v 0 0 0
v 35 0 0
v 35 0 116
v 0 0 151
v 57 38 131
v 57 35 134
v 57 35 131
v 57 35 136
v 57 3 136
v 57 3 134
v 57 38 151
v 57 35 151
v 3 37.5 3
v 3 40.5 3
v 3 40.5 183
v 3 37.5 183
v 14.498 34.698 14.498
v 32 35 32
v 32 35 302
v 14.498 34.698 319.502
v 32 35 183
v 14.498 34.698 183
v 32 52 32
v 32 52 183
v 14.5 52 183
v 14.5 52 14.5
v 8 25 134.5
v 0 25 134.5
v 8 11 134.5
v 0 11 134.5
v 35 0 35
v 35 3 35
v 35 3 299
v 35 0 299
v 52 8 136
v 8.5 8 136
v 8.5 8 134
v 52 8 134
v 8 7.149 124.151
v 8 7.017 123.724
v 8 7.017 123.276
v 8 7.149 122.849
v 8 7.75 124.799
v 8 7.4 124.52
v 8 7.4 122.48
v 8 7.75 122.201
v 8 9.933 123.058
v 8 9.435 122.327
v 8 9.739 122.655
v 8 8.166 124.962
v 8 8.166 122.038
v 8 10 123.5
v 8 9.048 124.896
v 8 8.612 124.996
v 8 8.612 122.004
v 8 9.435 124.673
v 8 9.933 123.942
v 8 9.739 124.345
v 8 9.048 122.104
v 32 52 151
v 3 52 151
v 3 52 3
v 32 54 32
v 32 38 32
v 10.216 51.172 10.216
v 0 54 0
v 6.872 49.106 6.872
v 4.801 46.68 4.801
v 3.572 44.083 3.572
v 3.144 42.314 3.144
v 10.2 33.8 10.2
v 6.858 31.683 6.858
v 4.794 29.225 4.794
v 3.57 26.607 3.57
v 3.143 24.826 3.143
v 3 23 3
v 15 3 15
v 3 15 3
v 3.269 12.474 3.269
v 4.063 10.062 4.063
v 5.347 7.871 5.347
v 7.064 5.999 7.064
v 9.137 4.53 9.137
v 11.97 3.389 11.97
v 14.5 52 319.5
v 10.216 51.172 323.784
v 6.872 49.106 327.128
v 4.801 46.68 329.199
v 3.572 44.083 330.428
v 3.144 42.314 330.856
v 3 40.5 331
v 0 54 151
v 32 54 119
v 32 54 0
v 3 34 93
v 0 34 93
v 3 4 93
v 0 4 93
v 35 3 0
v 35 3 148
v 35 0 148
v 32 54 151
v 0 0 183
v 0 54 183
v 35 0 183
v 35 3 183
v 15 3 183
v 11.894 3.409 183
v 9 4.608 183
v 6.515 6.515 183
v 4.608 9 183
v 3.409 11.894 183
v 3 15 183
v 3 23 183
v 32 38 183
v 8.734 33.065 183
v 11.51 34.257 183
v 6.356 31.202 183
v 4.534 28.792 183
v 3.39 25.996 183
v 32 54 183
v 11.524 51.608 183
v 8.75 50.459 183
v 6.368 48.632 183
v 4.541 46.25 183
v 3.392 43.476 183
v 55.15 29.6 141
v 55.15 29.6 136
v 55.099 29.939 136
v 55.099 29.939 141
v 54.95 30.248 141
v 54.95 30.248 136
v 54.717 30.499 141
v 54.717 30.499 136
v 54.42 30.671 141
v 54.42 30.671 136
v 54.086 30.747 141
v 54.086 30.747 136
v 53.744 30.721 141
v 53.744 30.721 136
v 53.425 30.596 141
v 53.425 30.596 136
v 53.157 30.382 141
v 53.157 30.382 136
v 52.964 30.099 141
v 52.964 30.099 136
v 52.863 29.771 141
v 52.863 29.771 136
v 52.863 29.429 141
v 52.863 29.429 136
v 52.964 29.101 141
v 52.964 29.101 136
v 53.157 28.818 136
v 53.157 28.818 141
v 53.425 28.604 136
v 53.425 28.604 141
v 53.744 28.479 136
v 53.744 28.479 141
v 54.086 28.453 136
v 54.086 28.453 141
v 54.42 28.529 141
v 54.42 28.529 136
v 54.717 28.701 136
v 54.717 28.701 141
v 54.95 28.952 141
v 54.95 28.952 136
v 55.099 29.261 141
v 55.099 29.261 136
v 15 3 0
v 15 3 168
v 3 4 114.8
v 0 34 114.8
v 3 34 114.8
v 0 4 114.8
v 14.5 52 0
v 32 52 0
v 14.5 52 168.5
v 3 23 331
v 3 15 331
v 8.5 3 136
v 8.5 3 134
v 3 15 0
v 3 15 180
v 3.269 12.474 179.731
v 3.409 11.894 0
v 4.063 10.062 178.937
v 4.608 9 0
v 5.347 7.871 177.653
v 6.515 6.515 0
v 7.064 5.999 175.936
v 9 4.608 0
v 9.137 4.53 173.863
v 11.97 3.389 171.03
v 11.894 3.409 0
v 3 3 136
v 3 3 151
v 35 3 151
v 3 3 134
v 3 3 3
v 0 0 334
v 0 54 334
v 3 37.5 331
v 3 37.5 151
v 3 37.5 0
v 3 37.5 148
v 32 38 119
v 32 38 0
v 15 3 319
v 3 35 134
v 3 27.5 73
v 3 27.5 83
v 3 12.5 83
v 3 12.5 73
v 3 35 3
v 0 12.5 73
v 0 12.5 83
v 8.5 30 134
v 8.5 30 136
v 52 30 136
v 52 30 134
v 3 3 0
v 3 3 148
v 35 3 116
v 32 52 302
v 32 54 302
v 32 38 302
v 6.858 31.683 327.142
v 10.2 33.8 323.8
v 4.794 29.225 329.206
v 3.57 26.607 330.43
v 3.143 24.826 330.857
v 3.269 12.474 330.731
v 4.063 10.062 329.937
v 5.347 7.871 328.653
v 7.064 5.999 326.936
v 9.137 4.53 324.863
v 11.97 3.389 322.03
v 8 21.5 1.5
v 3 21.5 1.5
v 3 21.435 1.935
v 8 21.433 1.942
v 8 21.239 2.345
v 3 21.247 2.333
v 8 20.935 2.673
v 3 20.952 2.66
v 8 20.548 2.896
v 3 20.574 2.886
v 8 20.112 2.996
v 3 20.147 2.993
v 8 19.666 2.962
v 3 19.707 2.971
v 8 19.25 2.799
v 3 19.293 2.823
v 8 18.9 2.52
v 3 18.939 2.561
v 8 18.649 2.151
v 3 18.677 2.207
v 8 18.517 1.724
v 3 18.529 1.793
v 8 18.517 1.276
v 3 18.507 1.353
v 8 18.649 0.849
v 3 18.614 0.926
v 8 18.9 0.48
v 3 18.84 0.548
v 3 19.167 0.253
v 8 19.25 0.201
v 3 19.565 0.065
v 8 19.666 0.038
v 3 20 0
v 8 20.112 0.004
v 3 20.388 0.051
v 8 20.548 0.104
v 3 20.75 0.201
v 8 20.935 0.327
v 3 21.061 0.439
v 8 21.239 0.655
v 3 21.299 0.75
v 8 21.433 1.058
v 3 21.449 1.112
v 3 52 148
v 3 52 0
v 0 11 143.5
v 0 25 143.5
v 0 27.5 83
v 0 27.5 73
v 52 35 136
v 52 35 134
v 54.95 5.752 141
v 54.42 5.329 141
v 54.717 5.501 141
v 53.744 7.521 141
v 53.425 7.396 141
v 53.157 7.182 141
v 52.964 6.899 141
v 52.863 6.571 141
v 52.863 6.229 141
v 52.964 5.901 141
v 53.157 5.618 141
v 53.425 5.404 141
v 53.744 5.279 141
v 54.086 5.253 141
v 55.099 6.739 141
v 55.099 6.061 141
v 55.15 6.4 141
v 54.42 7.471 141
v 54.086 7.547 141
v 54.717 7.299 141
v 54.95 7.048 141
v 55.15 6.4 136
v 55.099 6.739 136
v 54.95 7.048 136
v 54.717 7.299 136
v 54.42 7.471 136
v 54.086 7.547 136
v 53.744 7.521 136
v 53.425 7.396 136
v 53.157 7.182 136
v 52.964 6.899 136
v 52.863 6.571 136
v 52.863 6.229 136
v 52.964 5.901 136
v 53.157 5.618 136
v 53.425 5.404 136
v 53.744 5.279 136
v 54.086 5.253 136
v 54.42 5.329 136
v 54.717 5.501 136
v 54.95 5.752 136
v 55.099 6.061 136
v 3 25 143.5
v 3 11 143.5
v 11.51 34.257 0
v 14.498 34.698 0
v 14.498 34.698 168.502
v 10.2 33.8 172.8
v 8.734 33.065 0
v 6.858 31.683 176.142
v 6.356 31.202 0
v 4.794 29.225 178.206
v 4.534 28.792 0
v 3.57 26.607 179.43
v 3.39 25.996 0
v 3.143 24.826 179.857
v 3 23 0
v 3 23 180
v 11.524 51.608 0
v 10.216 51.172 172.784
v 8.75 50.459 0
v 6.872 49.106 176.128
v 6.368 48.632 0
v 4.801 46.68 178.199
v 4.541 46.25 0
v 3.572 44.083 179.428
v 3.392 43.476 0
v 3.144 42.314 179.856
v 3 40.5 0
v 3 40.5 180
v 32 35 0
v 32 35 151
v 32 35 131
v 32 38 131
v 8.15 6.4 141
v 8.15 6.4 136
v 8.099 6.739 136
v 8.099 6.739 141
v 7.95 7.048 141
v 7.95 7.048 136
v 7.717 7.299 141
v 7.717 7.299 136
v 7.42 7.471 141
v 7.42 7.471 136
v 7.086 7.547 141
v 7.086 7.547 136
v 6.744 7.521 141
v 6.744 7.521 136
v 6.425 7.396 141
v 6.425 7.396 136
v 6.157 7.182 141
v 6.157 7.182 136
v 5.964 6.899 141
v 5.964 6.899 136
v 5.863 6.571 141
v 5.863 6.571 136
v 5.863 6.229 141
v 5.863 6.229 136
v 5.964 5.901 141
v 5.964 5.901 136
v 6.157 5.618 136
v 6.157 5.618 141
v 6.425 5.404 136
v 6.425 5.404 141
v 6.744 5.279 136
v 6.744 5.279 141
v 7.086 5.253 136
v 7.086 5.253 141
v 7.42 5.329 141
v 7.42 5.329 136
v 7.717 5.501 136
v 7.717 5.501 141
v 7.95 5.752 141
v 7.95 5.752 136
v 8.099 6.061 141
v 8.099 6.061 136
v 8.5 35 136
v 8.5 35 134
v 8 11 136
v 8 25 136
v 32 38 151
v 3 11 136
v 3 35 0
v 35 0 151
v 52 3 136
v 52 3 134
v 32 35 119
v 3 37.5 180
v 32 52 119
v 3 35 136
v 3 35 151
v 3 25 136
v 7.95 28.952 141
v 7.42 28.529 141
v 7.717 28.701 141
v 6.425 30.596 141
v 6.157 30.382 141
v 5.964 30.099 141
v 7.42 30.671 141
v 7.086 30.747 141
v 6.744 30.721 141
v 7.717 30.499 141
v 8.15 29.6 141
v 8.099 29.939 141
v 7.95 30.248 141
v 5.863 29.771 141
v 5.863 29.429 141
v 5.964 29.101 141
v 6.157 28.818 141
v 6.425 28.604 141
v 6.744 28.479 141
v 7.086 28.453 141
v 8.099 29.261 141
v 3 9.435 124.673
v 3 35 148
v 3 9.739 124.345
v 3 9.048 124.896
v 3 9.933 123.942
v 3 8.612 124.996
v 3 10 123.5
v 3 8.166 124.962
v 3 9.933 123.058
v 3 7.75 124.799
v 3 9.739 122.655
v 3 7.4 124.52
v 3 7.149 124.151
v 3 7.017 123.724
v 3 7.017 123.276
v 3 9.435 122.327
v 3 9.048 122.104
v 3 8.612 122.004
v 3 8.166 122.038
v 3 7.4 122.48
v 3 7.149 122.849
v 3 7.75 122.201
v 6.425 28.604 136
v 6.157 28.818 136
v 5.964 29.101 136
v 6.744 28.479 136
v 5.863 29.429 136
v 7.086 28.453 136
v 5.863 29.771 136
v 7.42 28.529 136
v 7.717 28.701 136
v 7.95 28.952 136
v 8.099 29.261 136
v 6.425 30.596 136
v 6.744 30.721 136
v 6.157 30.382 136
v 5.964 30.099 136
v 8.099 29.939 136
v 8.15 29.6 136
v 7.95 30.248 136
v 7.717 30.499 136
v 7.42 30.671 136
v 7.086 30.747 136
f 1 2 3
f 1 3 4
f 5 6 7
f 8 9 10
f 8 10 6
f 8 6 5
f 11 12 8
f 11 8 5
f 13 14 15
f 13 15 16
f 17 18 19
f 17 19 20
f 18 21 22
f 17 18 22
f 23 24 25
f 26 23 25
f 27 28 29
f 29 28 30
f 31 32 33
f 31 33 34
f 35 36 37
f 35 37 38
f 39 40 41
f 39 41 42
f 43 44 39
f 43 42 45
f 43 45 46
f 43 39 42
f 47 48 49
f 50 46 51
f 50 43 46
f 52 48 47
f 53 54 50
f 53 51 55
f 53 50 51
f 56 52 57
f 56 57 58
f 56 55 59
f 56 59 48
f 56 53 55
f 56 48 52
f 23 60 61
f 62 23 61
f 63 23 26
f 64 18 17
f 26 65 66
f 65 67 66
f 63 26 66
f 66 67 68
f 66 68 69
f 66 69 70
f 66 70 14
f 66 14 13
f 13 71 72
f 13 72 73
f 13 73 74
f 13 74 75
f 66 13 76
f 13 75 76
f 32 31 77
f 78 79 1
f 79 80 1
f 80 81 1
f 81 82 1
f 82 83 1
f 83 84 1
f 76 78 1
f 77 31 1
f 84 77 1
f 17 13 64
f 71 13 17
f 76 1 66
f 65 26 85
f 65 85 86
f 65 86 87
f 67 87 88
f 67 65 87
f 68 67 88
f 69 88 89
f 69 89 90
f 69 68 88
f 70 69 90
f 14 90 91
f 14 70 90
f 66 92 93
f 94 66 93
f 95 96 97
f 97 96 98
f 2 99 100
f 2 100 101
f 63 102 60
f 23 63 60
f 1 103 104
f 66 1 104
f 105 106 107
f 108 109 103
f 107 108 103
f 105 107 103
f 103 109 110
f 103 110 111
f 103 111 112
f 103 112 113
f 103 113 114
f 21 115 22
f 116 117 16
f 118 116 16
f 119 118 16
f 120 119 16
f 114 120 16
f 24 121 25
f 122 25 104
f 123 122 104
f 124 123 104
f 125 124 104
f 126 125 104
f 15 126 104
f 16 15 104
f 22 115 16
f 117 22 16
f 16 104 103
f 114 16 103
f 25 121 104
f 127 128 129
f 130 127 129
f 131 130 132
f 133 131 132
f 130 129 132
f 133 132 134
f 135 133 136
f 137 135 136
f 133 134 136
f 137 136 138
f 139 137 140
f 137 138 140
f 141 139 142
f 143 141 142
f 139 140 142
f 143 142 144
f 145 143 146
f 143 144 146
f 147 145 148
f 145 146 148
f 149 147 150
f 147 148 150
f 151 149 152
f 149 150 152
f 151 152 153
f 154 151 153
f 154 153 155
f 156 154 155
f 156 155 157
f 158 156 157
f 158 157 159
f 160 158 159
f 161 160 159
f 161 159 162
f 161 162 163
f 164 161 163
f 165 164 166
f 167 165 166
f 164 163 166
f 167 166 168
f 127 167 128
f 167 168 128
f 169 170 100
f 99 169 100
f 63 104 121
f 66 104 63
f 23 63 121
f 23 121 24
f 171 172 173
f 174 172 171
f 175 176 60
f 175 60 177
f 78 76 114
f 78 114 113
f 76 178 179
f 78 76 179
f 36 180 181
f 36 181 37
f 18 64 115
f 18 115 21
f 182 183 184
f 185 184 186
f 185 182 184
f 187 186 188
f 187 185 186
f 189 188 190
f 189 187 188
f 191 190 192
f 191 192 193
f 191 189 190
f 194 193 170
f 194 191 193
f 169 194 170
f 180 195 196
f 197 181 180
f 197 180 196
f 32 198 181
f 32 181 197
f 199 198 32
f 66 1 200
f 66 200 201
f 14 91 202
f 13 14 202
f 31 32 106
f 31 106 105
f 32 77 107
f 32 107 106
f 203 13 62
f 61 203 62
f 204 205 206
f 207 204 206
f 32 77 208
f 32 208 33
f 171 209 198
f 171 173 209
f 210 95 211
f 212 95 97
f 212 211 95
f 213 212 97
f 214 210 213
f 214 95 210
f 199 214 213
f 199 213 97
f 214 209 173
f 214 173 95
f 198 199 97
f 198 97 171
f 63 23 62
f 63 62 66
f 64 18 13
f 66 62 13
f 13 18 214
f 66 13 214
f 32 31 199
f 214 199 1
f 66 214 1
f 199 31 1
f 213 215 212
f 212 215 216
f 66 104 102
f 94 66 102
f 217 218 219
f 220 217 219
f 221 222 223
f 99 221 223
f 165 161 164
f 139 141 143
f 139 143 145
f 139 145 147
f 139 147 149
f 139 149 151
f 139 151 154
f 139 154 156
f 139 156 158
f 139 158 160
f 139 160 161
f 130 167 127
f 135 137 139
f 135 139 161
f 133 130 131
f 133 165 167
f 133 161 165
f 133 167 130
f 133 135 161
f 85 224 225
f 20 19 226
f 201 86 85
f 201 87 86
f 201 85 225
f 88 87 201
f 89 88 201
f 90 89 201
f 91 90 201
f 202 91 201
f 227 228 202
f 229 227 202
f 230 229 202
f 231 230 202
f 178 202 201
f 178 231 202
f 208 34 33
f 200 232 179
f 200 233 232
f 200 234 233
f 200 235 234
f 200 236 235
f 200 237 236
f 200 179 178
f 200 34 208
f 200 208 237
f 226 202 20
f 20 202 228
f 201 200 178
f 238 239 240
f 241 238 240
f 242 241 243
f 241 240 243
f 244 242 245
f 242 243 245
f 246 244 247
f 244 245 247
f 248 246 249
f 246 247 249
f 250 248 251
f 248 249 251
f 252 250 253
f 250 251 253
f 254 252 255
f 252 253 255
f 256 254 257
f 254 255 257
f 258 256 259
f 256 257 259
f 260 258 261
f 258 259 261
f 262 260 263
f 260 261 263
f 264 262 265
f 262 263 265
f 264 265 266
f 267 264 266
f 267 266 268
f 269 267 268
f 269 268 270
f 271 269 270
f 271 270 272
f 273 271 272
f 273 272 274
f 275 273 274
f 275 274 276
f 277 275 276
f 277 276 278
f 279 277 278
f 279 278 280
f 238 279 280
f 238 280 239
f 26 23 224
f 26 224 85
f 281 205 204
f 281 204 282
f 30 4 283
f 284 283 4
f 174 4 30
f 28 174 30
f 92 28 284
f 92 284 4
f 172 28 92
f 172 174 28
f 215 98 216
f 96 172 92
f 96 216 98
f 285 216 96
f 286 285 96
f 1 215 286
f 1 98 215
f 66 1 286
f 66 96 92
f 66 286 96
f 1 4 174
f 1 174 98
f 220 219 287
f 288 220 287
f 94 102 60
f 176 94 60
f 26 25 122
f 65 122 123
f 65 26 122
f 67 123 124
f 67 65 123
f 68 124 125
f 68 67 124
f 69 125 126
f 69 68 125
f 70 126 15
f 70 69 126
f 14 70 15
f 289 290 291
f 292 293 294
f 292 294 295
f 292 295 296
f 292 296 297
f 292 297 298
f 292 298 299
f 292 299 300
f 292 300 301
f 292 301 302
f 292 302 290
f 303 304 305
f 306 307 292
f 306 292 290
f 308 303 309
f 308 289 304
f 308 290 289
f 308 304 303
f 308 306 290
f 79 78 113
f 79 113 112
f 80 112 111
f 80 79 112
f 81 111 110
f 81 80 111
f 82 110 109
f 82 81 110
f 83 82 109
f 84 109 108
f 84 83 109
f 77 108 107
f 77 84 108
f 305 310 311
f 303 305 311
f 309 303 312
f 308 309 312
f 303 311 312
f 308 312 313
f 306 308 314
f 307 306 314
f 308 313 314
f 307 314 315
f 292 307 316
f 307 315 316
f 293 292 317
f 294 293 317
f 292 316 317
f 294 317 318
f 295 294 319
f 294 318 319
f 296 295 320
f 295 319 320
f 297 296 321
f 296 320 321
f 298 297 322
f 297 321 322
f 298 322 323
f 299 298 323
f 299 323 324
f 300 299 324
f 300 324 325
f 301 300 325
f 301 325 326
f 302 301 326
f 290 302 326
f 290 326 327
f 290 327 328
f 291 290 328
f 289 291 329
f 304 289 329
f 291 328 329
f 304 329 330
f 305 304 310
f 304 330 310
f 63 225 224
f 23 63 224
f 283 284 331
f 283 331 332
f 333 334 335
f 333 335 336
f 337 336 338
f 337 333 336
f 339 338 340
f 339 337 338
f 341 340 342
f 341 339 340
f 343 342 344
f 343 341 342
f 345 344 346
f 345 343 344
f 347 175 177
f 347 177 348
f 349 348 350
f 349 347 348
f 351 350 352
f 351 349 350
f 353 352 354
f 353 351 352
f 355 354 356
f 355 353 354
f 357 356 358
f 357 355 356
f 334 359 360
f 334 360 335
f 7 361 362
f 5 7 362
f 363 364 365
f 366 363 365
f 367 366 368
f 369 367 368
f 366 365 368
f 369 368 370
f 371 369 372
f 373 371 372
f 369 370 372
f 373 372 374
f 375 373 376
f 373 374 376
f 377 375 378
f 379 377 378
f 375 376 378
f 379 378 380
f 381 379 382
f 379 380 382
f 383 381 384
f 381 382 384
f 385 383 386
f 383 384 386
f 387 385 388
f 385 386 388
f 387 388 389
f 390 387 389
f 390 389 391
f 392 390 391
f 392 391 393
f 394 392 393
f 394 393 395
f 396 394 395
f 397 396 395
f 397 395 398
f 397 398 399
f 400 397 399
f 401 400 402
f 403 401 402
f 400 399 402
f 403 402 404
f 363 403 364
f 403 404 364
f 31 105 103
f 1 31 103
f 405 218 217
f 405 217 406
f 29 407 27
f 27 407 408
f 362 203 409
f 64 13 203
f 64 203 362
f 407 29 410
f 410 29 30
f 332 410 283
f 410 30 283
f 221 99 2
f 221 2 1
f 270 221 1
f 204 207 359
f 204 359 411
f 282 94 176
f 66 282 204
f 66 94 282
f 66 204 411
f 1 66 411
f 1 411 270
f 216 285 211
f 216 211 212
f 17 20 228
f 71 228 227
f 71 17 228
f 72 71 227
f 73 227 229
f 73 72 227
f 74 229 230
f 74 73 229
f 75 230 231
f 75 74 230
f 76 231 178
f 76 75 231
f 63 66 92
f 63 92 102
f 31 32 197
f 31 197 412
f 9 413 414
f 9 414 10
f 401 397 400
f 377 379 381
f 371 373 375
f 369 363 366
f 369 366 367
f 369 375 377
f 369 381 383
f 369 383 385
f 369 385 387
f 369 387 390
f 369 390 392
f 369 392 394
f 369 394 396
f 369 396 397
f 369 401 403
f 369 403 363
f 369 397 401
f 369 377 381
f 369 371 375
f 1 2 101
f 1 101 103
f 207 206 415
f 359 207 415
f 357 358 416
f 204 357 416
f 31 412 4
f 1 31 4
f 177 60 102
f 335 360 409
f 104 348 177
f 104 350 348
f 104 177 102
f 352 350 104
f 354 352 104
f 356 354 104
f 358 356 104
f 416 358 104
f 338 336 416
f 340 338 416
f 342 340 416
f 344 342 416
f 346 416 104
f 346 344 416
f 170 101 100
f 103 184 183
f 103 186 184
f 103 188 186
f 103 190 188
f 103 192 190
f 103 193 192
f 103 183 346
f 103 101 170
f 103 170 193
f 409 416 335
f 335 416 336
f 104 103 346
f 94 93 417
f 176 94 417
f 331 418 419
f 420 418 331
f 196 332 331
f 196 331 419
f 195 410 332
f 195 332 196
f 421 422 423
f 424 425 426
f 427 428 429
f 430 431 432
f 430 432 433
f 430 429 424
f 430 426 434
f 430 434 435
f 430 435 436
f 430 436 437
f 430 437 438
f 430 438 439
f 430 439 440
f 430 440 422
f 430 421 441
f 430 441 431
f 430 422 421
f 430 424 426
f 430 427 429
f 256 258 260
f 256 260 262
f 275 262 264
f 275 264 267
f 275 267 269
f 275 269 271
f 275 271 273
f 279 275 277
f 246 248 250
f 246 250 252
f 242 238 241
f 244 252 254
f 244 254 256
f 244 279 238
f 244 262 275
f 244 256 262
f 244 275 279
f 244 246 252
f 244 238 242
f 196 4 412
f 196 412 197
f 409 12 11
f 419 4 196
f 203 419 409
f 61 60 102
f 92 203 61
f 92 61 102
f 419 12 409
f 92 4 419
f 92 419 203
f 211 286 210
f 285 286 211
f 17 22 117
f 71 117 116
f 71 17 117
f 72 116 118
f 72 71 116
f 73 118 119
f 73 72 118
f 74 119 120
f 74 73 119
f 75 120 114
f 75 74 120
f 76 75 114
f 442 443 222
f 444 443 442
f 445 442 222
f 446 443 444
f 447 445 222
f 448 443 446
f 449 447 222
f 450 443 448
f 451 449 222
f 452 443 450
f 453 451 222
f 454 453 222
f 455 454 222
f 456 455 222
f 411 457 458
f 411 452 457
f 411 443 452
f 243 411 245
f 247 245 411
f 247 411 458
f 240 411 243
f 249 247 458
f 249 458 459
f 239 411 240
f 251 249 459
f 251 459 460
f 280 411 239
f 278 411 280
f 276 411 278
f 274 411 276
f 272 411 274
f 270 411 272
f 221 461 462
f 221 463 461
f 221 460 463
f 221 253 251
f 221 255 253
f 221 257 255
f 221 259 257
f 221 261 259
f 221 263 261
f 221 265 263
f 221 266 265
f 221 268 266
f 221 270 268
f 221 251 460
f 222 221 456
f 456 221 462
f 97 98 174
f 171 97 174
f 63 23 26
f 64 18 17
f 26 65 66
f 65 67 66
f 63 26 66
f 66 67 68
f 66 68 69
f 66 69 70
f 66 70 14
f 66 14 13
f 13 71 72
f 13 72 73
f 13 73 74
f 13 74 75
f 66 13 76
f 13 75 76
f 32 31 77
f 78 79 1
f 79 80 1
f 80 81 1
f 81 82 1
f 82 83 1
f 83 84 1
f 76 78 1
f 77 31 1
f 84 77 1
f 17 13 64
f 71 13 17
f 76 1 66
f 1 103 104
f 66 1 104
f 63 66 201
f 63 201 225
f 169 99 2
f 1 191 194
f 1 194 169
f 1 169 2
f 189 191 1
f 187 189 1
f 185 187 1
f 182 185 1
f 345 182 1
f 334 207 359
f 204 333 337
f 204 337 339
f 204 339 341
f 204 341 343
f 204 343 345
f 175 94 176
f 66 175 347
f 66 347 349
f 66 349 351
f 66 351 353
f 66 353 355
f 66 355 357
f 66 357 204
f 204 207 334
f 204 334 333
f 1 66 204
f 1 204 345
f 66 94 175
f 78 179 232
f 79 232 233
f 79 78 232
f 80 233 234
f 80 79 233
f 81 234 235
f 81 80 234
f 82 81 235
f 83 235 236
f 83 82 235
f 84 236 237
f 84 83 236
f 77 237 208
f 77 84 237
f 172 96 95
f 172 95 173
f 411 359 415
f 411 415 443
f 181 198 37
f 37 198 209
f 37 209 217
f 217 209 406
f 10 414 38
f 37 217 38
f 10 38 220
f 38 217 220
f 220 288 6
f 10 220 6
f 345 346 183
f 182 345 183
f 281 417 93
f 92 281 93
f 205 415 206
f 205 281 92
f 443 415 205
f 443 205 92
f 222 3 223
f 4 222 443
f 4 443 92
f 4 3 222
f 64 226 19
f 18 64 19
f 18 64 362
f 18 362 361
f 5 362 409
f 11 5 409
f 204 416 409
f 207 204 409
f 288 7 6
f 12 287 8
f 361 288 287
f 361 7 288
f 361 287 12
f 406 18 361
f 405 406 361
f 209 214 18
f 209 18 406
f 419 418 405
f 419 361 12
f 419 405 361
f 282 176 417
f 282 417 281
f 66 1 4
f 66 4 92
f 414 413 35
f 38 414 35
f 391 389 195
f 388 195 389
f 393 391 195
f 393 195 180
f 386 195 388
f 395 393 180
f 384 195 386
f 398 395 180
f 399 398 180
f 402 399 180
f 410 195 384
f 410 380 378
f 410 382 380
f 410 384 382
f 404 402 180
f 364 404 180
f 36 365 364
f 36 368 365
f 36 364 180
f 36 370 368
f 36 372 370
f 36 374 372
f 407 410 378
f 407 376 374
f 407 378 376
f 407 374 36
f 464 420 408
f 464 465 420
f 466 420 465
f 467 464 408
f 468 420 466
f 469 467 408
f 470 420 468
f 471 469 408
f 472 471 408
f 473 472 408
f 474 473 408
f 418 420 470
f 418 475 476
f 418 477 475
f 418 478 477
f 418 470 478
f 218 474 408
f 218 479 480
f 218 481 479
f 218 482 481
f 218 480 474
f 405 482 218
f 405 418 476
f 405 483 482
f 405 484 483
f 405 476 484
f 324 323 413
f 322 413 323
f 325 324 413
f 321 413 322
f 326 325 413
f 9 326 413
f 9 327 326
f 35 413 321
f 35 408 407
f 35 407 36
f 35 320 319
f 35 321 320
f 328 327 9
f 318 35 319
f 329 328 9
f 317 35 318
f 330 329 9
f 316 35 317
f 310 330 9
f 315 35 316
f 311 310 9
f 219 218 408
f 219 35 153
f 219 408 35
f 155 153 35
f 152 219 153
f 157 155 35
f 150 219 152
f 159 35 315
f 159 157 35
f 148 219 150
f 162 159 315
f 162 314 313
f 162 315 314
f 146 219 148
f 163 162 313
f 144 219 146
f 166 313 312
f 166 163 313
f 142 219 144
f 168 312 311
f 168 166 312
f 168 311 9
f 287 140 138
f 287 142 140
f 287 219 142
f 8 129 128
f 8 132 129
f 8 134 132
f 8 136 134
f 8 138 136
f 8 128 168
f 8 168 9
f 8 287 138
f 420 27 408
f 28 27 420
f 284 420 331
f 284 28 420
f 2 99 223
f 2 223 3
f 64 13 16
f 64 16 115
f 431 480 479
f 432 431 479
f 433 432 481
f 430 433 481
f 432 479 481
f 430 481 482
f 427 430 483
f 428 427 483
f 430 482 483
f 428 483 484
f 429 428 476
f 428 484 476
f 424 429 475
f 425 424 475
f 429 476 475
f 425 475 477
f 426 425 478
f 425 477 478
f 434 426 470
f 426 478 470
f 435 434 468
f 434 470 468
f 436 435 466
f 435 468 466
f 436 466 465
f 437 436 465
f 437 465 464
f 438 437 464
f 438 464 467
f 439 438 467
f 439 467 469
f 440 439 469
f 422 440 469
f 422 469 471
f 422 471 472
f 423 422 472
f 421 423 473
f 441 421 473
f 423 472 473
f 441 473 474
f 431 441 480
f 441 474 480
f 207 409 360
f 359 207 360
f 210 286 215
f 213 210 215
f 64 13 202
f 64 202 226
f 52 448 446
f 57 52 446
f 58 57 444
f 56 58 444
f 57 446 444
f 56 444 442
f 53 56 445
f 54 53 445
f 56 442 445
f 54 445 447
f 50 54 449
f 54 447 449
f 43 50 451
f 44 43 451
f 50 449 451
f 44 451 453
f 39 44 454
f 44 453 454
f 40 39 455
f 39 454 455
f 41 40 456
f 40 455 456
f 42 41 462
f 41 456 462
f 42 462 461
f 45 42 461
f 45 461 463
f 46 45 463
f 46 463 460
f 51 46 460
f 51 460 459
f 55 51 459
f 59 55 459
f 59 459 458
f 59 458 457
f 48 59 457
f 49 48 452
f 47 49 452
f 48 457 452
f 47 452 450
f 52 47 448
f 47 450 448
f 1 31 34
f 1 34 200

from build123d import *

# Parameters (mm, degrees)
PAD_DEPTH       = 334
POCKET_DEPTH    = 54.001
POCKET001_DEPTH = 54.001
PAD001_DEPTH    = 183
POCKET003_DEPTH = 54.001
PAD002_DEPTH    = 183
POCKET004_DEPTH = 54.001
PAD003_DEPTH    = 151
POCKET006_DEPTH = 54.001
SKETCH011_R     = 1.5
PAD004_DEPTH    = 5
PAD005_DEPTH    = 151
POCKET007_DEPTH = 54.001
SKETCH014_W     = 15
SKETCH014_H     = 10
SKETCH014_W_2   = 30
SKETCH014_H_2   = 21.8
SKETCH014_W_3   = 14
SKETCH014_H_3   = 9
POCKET008_DEPTH = 5
SKETCH015_W     = 54
SKETCH015_H     = 2
PAD006_DEPTH    = 32
SKETCH016_R     = 1.15
PAD007_DEPTH    = 5
SKETCH017_W     = 43.5
SKETCH017_H     = 5
POCKET009_DEPTH = 5
SKETCH018_W     = 3
SKETCH018_H     = 20
PAD008_DEPTH    = 25
SKETCH019_W     = 5
SKETCH019_H     = 14
POCKET010_DEPTH = 1.5


with BuildPart() as top_and_left:
    # Sketch → Pad (new body)
    with BuildSketch(Plane.XY):
        with BuildLine():
            Line((32, 52), (14.5, 52))
            ThreePointArc((14.5, 52), (6.368272, 48.631728), (3, 40.5))
            Line((3, 40.5), (3, 37.5))
            Line((3, 37.5), (32, 38))
            Line((32, 38), (32, 35))
            Line((32, 35), (14.498291, 34.698246))
            ThreePointArc((14.498291, 34.698246), (6.355841, 31.201519), (3, 23))
            Line((3, 23), (3, 15))
            ThreePointArc((3, 15), (6.514719, 6.514719), (15, 3))
            Line((15, 3), (35, 3))
            Line((35, 3), (35, 0))
            Line((35, 0), (0, 0))
            Line((0, 0), (0, 54))
            Line((0, 54), (32, 54))
            Line((32, 54), (32, 52))
        make_face()
    extrude(amount=PAD_DEPTH)

    # Sketch001 → Pocket (cut, through all)
    with BuildSketch(Plane.XZ):
        Polygon((0, 334), (35, 334), (35, 299), align=None)
    extrude(amount=-POCKET_DEPTH, mode=Mode.SUBTRACT)

    # Sketch002 → Pocket001 (cut, through all)
    with BuildSketch(Plane.XZ):
        Polygon((0, 0), (35, 0), (35, 35), align=None)
    extrude(amount=-POCKET001_DEPTH, mode=Mode.SUBTRACT)


with BuildPart() as bottom_l:
    # Sketch003 → Pad001 (new body)
    with BuildSketch(Plane.XY):
        with BuildLine():
            Line((32, 52), (14.5, 52))
            ThreePointArc((14.5, 52), (6.368272, 48.631728), (3, 40.5))
            Line((3, 40.5), (3, 37.5))
            Line((3, 37.5), (32, 38))
            Line((32, 38), (32, 35))
            Line((32, 35), (14.498291, 34.698246))
            ThreePointArc((14.498291, 34.698246), (6.355841, 31.201519), (3, 23))
            Line((3, 23), (3, 15))
            ThreePointArc((3, 15), (6.514719, 6.514719), (15, 3))
            Line((15, 3), (35, 3))
            Line((35, 3), (35, 0))
            Line((35, 0), (0, 0))
            Line((0, 0), (0, 54))
            Line((0, 54), (32, 54))
            Line((32, 54), (32, 52))
        make_face()
    extrude(amount=PAD001_DEPTH)

    # Sketch005 → Pocket003 (cut, through all)
    with BuildSketch(Plane.XZ):
        Polygon((0, 0), (35, 0), (35, 35), align=None)
    extrude(amount=-POCKET003_DEPTH, mode=Mode.SUBTRACT)


with BuildPart() as right_u:
    # Sketch006 → Pad002 (new body)
    with BuildSketch(Plane.XY):
        with BuildLine():
            Line((32, 52), (14.5, 52))
            ThreePointArc((14.5, 52), (6.368272, 48.631728), (3, 40.5))
            Line((3, 40.5), (3, 37.5))
            Line((3, 37.5), (32, 38))
            Line((32, 38), (32, 35))
            Line((32, 35), (14.498291, 34.698246))
            ThreePointArc((14.498291, 34.698246), (6.355841, 31.201519), (3, 23))
            Line((3, 23), (3, 15))
            ThreePointArc((3, 15), (6.514719, 6.514719), (15, 3))
            Line((15, 3), (35, 3))
            Line((35, 3), (35, 0))
            Line((35, 0), (0, 0))
            Line((0, 0), (0, 54))
            Line((0, 54), (32, 54))
            Line((32, 54), (32, 52))
        make_face()
    extrude(amount=PAD002_DEPTH)

    # Sketch007 → Pocket004 (cut, through all)
    with BuildSketch(Plane.XZ):
        Polygon((0, 183), (35, 183), (35, 148), align=None)
    extrude(amount=-POCKET004_DEPTH, mode=Mode.SUBTRACT)


with BuildPart() as bottom_r:
    # Sketch008 → Pad003 (new body)
    with BuildSketch(Plane.XY):
        Polygon((3, 40.5), (3, 37.5), (32, 38), (32, 35), (3, 35), (3, 3), (35, 3), (35, 0), (0, 0), (0, 54), (32, 54), (32, 52), (3, 52), align=None)
    extrude(amount=PAD003_DEPTH)

    # Sketch010 → Pocket006 (cut, through all)
    with BuildSketch(Plane.XZ):
        Polygon((0, 151), (35, 151), (35, 116), align=None)
    extrude(amount=-POCKET006_DEPTH, mode=Mode.SUBTRACT)

    # Sketch011 (on Face9 of Pocket006) → Pad004 (join)
    with BuildSketch(Plane.YZ.offset(3)):
        with Locations((8.5, 123.5)):
            Circle(SKETCH011_R)
        with Locations((20, 1.5)):
            Circle(SKETCH011_R)
    extrude(amount=PAD004_DEPTH)


with BuildPart() as right_b:
    # Sketch012 → Pad005 (new body)
    with BuildSketch(Plane.XY):
        Polygon((3, 40.5), (3, 37.5), (32, 38), (32, 35), (3, 35), (3, 3), (35, 3), (35, 0), (0, 0), (0, 54), (32, 54), (32, 52), (3, 52), align=None)
    extrude(amount=PAD005_DEPTH)

    # Sketch013 → Pocket007 (cut, through all)
    with BuildSketch(Plane.XZ):
        Polygon((0, 0), (35, 0), (35, 35), align=None)
    extrude(amount=-POCKET007_DEPTH, mode=Mode.SUBTRACT)

    # Sketch014 (on Face7 of Pocket007) → Pocket008 (cut)
    with BuildSketch(Plane(origin=(0, 0, 0), x_dir=(0, -1, 0), z_dir=(-1, 0, 0))):
        with Locations((-20, 78)):
            Rectangle(SKETCH014_W, SKETCH014_H)
        with Locations((-19, 103.9)):
            Rectangle(SKETCH014_W_2, SKETCH014_H_2)
        with Locations((-18, 139)):
            Rectangle(SKETCH014_W_3, SKETCH014_H_3)
    extrude(amount=-POCKET008_DEPTH, mode=Mode.SUBTRACT)

    # Sketch015 (on Face12 of Pocket008) → Pad006 (join)
    with BuildSketch(Plane.XZ.offset(-35)):
        with Locations((30, 135)):
            Rectangle(SKETCH015_W, SKETCH015_H)
    extrude(amount=PAD006_DEPTH)

    # Sketch016 (on Face34 of Pad006) → Pad007 (join)
    with BuildSketch(Plane.XY.offset(136)):
        with Locations((7, 29.6)):
            Circle(SKETCH016_R)
        with Locations((7, 6.4)):
            Circle(SKETCH016_R)
        with Locations((54, 29.6)):
            Circle(SKETCH016_R)
        with Locations((54, 6.4)):
            Circle(SKETCH016_R)
    extrude(amount=PAD007_DEPTH)

    # Sketch017 (on Face34 of Pad007) → Pocket009 (cut)
    with BuildSketch(Plane.XY.offset(136)):
        with Locations((30.25, 32.5)):
            Rectangle(SKETCH017_W, SKETCH017_H)
        with Locations((30.25, 5.5)):
            Rectangle(SKETCH017_W, SKETCH017_H)
    extrude(amount=-POCKET009_DEPTH, mode=Mode.SUBTRACT)

    # Sketch018 (on Face11 of Pocket009) → Pad008 (join)
    with BuildSketch(Plane.YZ.offset(32)):
        with Locations((36.5, 141)):
            Rectangle(SKETCH018_W, SKETCH018_H)
    extrude(amount=PAD008_DEPTH)

    # Sketch019 (on Face40 of Pad008) → Pocket010 (cut)
    with BuildSketch(Plane.XY.offset(136)):
        with Locations((5.5, 18)):
            Rectangle(SKETCH019_W, SKETCH019_H)
    extrude(amount=-POCKET010_DEPTH, mode=Mode.SUBTRACT)


solid = Compound([top_and_left.part, bottom_l.part, right_u.part, bottom_r.part, right_b.part])
